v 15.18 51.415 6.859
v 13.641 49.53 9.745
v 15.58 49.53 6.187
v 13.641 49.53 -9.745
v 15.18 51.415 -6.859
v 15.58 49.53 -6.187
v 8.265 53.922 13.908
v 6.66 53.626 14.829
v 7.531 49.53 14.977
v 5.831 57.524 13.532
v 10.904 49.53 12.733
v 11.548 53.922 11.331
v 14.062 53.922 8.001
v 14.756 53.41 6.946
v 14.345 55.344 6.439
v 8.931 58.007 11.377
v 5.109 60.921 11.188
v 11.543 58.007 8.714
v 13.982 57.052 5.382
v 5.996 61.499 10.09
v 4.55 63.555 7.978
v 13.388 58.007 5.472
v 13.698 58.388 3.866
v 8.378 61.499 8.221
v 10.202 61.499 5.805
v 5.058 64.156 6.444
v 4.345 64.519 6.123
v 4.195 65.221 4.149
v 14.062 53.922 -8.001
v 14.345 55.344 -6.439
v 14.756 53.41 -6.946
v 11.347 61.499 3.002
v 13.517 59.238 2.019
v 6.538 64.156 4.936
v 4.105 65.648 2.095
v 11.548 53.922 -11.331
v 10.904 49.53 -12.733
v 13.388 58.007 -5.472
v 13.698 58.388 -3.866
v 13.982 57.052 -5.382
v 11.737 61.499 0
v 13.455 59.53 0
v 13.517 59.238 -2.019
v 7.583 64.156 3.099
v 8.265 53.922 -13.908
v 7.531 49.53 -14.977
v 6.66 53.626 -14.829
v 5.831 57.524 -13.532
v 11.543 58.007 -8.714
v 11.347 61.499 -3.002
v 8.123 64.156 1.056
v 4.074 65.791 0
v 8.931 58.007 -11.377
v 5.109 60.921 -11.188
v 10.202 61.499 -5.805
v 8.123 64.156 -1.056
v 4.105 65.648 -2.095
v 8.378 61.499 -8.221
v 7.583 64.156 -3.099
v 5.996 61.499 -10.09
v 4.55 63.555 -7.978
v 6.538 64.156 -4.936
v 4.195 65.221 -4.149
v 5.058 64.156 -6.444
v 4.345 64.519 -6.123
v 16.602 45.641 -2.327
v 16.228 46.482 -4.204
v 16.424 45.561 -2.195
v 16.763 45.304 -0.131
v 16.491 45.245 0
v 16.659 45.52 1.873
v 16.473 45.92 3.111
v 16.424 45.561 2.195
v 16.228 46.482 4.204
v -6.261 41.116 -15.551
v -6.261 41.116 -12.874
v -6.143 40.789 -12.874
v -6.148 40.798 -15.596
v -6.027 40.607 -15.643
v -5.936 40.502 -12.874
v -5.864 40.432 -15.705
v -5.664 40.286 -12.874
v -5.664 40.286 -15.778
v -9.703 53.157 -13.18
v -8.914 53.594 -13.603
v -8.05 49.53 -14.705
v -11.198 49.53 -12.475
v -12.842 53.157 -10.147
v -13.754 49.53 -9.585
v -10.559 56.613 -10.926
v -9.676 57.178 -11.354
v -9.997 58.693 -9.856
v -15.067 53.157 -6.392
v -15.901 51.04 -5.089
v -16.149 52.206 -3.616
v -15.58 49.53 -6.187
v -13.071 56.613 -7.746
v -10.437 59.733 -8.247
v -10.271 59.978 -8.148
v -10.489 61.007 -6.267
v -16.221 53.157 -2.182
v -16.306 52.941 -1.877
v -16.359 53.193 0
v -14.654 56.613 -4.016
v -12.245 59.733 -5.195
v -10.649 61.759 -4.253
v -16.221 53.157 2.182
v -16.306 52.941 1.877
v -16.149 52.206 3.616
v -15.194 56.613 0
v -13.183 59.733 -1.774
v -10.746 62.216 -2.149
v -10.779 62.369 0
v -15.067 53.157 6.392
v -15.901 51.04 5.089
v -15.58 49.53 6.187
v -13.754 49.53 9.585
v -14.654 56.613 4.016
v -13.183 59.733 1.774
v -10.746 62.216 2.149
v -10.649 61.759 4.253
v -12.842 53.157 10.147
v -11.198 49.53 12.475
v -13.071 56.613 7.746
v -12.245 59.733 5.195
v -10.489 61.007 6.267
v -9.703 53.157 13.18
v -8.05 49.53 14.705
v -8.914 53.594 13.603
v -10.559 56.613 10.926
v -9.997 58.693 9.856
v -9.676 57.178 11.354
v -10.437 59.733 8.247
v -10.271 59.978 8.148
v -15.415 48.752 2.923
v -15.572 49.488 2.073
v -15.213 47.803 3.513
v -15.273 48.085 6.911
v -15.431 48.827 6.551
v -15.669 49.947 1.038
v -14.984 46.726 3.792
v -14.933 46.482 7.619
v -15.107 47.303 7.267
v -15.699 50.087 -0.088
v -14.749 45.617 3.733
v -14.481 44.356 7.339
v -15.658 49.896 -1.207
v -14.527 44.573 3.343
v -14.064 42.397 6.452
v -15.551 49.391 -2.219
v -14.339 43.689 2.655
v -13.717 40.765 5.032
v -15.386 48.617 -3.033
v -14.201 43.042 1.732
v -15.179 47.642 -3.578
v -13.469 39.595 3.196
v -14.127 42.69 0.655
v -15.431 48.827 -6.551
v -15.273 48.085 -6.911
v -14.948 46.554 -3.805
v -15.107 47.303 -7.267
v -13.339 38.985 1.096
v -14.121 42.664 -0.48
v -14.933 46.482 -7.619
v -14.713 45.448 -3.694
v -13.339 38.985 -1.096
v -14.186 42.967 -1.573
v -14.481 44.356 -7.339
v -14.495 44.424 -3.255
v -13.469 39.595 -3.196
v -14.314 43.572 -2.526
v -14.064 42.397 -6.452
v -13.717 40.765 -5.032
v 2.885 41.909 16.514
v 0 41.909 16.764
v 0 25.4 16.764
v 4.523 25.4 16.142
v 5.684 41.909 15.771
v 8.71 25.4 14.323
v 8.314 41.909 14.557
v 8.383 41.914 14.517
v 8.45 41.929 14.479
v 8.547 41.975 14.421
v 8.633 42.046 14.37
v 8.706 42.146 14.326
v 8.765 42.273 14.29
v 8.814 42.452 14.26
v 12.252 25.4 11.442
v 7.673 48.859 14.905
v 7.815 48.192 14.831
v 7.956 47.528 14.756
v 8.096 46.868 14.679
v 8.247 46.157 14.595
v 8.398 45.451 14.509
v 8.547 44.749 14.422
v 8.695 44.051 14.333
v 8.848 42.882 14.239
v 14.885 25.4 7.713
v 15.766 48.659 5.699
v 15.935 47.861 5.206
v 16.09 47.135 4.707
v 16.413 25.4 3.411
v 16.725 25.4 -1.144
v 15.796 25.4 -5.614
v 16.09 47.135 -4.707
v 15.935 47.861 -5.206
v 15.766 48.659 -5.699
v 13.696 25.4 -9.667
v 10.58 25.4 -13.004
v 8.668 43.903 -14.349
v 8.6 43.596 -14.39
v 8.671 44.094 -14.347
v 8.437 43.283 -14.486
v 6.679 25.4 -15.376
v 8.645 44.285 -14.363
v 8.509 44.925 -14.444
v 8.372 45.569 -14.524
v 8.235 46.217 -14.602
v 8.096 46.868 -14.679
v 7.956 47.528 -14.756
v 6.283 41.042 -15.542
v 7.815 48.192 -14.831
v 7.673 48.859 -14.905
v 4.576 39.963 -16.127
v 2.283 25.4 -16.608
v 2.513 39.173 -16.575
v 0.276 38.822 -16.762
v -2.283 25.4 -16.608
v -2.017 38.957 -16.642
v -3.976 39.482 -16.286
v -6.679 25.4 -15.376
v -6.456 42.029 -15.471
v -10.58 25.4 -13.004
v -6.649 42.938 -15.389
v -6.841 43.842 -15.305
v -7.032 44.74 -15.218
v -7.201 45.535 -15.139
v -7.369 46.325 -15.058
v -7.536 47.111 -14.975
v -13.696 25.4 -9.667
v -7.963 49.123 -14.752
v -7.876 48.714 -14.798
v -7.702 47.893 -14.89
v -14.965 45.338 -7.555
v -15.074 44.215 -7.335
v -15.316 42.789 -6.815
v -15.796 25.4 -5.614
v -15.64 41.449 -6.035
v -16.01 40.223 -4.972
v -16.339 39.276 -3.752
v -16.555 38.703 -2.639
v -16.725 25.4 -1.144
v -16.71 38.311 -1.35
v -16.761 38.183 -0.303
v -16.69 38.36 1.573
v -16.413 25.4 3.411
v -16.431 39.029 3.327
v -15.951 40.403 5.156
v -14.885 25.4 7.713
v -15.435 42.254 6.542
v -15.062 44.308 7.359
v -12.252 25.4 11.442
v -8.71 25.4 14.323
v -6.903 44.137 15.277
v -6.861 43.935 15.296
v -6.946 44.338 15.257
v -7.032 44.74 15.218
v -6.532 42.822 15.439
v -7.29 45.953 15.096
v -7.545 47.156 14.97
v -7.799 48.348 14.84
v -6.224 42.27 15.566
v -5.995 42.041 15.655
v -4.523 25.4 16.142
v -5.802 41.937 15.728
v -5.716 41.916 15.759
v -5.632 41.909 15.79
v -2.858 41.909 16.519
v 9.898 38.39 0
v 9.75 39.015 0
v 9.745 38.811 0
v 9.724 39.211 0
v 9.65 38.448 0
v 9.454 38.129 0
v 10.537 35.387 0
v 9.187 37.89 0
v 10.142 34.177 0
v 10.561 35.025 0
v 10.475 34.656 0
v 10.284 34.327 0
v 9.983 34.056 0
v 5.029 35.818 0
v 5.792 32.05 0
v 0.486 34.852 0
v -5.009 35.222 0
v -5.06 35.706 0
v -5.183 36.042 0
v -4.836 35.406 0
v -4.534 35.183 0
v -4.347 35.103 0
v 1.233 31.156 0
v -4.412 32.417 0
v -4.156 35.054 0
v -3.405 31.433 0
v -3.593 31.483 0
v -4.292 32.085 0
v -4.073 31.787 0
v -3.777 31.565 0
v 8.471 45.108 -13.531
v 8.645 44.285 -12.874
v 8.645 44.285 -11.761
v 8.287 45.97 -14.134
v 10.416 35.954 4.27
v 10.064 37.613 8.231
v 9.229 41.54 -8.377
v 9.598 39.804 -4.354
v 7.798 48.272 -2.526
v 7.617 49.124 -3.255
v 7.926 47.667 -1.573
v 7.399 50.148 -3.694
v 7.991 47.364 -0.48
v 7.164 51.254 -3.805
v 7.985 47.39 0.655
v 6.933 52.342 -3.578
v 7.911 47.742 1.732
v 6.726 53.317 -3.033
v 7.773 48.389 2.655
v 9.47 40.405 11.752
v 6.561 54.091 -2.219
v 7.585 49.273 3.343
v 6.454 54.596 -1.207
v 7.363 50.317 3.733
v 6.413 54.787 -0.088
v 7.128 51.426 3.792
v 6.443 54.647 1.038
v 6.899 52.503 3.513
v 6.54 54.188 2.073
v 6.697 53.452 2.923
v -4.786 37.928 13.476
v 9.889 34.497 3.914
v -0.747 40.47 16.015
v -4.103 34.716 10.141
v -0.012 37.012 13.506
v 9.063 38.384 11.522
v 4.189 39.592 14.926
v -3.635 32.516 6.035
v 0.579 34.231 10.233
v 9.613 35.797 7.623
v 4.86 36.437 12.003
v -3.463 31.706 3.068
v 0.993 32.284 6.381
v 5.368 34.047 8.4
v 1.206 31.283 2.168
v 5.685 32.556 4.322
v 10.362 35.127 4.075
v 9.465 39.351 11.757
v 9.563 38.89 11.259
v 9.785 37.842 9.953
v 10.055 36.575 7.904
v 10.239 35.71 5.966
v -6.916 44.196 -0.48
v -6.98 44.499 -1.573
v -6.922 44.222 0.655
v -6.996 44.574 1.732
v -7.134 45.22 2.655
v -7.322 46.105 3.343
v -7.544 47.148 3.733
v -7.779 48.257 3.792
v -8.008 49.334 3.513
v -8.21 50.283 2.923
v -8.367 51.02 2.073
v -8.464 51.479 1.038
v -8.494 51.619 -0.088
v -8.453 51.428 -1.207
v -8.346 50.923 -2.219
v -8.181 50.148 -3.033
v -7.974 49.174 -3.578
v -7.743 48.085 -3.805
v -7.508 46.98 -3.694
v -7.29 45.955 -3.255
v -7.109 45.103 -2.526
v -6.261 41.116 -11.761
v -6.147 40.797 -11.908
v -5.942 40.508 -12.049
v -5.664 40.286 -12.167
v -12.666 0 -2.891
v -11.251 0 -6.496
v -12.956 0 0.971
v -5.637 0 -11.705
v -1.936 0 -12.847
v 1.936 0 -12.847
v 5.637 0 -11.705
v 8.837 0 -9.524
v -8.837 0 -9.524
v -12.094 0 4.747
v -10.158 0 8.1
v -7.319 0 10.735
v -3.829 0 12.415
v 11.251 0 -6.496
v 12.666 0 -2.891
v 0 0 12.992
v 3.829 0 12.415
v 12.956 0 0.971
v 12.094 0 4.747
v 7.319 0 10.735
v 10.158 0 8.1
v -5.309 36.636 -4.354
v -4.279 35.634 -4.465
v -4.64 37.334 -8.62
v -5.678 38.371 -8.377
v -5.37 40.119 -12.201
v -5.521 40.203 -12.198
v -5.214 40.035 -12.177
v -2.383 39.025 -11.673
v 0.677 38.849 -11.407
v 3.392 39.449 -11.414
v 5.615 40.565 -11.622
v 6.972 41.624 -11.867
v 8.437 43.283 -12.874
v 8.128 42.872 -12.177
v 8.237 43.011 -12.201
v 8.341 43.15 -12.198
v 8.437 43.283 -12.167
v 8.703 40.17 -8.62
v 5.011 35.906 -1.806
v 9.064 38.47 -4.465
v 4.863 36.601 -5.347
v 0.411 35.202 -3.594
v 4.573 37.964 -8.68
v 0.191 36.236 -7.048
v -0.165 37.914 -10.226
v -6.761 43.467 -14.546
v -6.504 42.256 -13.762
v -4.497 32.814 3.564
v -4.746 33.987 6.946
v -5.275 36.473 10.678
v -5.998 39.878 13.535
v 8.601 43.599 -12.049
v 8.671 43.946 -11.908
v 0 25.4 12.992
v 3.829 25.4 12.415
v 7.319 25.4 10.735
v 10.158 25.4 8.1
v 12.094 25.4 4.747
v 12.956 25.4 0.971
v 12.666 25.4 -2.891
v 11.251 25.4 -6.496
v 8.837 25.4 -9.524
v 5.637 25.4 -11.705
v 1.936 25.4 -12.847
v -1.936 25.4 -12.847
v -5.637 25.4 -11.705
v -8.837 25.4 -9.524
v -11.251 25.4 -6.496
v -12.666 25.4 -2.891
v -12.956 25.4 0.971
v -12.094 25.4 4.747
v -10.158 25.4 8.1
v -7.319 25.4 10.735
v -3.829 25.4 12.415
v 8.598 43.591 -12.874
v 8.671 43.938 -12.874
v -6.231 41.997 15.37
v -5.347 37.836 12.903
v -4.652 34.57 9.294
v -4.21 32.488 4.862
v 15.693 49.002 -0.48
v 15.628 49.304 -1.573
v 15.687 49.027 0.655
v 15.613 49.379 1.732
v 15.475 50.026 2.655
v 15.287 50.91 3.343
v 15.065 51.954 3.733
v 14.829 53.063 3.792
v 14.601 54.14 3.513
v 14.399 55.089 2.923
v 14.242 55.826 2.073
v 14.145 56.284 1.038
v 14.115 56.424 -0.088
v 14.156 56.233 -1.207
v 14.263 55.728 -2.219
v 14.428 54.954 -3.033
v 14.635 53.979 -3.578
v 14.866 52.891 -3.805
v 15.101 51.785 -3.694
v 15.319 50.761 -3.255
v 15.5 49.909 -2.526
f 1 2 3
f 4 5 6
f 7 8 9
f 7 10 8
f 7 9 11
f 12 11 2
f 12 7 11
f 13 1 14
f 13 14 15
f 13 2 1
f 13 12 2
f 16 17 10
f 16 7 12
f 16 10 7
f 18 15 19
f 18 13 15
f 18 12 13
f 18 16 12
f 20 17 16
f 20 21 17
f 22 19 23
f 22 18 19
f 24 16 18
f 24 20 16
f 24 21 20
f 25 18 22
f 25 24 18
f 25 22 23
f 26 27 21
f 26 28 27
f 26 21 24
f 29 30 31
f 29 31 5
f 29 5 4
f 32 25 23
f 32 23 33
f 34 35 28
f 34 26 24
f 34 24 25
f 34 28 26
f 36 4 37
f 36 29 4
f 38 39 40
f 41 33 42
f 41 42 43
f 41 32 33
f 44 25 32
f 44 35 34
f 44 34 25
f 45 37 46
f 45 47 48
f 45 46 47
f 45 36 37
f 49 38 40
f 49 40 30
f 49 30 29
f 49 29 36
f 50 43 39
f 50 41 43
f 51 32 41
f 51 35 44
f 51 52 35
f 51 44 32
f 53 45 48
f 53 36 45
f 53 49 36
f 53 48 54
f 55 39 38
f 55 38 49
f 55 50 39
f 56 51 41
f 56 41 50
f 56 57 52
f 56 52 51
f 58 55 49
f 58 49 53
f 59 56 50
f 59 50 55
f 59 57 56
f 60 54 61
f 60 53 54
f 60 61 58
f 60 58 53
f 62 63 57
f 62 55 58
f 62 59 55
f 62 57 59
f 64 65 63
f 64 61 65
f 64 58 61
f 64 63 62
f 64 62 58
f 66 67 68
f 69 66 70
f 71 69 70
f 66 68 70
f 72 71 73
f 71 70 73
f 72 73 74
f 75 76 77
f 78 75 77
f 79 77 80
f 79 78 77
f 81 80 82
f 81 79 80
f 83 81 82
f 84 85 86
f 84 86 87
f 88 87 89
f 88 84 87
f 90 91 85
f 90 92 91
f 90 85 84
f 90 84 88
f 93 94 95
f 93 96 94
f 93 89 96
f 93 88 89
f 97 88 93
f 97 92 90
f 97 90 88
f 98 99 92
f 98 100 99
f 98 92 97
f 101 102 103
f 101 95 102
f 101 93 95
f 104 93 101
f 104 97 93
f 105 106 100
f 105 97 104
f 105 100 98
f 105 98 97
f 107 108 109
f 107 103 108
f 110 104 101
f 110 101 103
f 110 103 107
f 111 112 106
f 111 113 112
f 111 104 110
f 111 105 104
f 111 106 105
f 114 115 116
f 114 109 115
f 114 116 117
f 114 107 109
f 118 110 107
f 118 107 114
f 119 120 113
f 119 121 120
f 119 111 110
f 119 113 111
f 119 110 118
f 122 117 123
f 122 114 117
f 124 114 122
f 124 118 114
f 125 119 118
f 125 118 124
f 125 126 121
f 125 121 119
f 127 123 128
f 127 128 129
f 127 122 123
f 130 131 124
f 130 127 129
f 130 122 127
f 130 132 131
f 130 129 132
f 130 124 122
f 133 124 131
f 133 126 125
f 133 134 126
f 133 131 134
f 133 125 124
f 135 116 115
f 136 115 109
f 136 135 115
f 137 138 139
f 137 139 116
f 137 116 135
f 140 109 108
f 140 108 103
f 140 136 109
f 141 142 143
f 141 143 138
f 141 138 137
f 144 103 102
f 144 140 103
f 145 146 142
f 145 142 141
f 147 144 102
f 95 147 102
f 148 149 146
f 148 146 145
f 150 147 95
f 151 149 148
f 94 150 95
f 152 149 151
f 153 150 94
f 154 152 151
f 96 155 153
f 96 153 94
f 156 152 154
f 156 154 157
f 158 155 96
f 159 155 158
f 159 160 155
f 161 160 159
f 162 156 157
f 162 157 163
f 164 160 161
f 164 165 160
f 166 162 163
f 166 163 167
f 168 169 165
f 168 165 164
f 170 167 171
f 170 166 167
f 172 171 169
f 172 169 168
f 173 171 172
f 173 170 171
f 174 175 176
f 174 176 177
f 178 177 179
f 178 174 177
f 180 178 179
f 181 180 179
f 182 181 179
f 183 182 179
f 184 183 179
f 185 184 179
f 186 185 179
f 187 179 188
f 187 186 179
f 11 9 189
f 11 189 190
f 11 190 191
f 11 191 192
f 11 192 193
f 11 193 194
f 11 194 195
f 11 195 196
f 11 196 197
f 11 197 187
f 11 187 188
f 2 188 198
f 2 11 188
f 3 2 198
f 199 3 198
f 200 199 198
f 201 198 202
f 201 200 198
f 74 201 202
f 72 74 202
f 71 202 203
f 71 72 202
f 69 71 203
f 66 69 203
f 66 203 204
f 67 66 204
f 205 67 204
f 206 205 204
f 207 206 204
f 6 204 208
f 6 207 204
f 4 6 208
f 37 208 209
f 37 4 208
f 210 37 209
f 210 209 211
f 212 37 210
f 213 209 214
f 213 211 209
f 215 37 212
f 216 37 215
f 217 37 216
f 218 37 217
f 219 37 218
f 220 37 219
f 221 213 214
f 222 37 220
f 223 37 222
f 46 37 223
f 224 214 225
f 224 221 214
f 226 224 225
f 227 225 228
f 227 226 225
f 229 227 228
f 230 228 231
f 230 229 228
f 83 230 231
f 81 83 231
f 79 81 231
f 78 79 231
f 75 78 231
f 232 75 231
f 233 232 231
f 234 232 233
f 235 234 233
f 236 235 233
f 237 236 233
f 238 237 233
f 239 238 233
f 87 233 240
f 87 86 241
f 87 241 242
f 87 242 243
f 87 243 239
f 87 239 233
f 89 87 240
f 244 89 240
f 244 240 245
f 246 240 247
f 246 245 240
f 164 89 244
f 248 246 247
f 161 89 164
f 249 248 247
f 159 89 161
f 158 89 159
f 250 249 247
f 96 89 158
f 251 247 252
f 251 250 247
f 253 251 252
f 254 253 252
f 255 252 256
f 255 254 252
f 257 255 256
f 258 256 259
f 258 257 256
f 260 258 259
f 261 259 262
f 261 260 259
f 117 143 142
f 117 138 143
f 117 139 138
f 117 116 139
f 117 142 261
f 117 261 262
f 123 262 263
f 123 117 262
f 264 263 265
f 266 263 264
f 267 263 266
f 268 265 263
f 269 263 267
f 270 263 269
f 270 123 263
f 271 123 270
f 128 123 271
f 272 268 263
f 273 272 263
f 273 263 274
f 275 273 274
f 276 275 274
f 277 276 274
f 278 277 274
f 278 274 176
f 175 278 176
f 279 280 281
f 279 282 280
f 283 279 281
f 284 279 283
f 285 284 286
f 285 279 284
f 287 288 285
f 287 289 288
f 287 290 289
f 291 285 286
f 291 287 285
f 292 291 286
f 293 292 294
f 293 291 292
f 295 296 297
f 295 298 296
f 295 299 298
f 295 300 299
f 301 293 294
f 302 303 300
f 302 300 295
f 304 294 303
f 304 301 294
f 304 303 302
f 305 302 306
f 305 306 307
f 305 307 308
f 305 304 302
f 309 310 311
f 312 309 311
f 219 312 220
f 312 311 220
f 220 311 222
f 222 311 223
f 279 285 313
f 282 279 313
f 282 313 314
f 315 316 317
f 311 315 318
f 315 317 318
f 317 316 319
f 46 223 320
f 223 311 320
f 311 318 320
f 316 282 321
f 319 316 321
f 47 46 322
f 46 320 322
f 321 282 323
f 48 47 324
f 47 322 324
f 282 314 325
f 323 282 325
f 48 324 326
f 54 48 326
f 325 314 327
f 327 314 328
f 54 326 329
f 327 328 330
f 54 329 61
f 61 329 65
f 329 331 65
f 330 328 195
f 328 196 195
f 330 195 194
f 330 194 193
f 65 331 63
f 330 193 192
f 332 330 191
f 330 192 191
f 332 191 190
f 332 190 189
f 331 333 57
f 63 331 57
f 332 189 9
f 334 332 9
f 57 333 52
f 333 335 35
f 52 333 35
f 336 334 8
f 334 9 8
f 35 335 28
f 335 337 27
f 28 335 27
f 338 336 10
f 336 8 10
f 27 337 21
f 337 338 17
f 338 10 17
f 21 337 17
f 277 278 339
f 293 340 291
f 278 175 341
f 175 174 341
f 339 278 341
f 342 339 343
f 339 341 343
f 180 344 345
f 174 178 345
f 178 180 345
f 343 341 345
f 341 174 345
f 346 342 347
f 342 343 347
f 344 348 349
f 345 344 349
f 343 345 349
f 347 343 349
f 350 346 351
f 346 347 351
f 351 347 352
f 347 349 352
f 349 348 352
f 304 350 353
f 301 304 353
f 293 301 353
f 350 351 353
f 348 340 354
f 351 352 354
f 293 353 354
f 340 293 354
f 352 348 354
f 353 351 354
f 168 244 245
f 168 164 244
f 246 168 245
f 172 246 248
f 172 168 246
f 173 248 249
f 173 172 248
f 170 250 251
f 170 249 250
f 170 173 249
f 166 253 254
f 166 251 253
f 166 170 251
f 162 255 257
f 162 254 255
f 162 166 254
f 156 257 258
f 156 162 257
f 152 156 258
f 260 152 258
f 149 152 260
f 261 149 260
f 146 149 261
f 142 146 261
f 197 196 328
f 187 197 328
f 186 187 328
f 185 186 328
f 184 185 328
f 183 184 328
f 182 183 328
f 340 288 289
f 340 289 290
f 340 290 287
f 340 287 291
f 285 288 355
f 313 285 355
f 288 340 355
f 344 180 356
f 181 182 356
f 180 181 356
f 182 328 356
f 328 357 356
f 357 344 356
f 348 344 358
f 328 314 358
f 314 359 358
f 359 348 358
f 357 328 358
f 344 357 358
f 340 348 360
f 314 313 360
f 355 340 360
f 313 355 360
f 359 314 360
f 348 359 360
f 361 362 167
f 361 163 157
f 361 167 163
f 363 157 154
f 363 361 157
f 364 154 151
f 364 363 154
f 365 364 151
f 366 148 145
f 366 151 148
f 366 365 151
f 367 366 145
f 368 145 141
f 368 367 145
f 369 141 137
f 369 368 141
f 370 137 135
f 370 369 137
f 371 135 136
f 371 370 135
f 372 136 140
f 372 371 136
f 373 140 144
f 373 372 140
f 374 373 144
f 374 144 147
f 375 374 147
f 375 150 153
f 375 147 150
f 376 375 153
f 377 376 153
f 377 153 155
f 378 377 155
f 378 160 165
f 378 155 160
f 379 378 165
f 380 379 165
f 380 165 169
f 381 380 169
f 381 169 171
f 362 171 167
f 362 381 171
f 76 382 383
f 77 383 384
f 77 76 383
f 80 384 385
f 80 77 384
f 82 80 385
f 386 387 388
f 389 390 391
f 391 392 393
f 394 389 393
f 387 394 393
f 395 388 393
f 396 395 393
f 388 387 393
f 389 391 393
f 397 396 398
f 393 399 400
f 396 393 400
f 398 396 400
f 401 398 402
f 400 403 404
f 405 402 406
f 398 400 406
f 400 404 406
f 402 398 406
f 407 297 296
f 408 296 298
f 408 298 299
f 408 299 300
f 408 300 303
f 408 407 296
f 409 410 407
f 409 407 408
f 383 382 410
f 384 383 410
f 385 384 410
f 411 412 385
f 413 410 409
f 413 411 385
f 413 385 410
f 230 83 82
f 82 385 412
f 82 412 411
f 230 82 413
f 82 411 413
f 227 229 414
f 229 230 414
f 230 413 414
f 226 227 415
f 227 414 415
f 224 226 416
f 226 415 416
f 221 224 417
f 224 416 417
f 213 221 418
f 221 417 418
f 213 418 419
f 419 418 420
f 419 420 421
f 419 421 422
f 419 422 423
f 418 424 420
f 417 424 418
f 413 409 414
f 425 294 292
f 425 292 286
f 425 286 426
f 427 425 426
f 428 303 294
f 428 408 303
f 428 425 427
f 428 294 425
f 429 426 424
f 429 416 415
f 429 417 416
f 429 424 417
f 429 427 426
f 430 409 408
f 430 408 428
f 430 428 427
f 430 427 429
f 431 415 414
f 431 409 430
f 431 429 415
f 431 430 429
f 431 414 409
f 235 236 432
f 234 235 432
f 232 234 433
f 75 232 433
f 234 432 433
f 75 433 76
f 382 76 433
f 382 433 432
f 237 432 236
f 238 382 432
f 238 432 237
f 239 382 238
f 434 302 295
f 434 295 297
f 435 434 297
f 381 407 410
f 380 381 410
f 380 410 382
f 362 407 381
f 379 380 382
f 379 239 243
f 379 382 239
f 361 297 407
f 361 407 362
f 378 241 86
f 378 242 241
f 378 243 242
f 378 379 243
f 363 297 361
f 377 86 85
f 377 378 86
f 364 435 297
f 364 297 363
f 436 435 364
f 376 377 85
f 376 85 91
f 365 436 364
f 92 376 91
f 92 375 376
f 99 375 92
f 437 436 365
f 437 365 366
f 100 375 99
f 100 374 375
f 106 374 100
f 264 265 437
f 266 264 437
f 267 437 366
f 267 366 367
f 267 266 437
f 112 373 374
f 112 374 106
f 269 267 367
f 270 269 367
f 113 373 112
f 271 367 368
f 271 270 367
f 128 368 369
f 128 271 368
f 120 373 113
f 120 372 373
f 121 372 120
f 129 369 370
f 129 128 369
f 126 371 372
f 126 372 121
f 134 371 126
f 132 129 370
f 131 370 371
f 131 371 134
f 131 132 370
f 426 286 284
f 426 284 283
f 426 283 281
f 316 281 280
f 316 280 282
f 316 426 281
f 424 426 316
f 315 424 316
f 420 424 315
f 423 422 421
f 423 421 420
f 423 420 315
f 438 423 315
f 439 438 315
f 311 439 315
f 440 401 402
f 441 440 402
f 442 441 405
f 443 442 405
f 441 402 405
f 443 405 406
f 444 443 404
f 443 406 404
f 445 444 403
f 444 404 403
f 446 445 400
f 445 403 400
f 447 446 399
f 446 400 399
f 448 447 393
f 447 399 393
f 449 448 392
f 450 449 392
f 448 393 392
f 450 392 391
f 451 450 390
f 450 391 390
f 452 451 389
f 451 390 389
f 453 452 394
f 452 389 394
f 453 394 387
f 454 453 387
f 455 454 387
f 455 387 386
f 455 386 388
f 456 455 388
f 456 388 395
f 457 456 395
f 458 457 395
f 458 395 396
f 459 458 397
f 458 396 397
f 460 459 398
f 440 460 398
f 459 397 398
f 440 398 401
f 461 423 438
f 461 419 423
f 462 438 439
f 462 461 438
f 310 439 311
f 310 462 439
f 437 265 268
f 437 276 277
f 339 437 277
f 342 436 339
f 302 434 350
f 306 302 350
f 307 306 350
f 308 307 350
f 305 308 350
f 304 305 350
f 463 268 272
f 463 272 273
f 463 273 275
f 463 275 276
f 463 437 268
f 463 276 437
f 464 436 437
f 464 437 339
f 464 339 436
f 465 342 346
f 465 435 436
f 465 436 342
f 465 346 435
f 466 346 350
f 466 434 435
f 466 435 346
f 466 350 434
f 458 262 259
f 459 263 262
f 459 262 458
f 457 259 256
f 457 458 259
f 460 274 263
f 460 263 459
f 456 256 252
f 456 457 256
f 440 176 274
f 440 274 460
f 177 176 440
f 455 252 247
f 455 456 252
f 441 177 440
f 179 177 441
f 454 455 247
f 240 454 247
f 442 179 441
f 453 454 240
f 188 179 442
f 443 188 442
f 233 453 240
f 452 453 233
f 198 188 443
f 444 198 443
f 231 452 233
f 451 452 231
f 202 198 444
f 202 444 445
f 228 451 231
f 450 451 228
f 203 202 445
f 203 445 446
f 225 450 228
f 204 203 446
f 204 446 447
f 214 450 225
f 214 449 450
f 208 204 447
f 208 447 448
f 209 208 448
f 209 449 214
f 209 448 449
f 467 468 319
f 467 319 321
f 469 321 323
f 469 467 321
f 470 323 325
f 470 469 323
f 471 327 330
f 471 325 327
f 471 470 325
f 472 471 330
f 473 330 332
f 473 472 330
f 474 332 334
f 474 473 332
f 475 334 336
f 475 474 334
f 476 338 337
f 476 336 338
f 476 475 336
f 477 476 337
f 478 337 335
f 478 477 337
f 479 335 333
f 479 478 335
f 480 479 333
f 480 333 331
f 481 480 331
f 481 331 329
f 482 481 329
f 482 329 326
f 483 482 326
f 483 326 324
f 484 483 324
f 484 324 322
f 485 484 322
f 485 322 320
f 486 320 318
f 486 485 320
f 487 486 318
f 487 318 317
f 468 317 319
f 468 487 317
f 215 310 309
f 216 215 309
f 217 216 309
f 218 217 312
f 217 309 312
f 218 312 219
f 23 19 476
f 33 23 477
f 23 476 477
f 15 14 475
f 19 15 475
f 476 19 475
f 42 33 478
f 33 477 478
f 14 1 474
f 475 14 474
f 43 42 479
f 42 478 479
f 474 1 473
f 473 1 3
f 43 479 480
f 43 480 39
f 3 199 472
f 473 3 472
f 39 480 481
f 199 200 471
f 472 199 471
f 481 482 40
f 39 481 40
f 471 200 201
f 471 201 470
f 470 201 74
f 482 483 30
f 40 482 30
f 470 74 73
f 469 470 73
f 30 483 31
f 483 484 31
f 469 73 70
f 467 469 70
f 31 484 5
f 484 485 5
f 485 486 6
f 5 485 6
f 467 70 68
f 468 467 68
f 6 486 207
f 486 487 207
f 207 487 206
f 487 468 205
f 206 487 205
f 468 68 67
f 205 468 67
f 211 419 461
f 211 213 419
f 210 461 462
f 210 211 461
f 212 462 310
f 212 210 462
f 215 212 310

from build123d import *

# Parameters (mm, degrees)
SKETCH1_R                     = 12.9921
BOSS_EXTRUDE1_DEPTH           = 25.4
CUT_EXTRUDE1_DEPTH            = 104.344307451
CUT_EXTRUDE1_DEPTH_BACK       = 104.344307451
SKETCH3_R                     = 3.81
CUT_REVOLVE10_ANGLE           = 90
CUT_REVOLVE10_OTHER_WAY_ANGLE = 180
CUT_EXTRUDE4_DEPTH            = 32.004
FILLET1_R                     = 1.27
SKETCH15_R                    = 7.62
CUT_EXTRUDE5_DEPTH            = 10.16


with BuildPart() as part:
    # Sketch1 → Boss-Extrude1 (new body)
    with BuildSketch(Plane(origin=(0, 0, 0), x_dir=(1, 0, 0), z_dir=(0, 1, 0))):
        Circle(SKETCH1_R)
    extrude(amount=BOSS_EXTRUDE1_DEPTH)

    # Sketch2 → Revolve1 (revolve)
    with BuildSketch(Plane(origin=(0, 0, 0), x_dir=(0, 0, -1), z_dir=(1, 0, 0))):
        with BuildLine():
            Line((-16.764, 25.4), (-16.764, 49.53))
            ThreePointArc((-16.764, 49.53), (-11.85393808, 61.38393808), (0, 66.294))
            Line((0, 66.294), (0, 25.4))
            Line((0, 25.4), (-16.764, 25.4))
        make_face()
    revolve(axis=Axis((0, 25.4, 0), (0, 1, 0)))

    # Sketch3 → Cut-Extrude1 (cut, two sides: drawn at the far end of the back side and taken through both)
    with BuildSketch(Plane(origin=(-10.366451402, 98.300319395, 0), x_dir=(0, 0, -1), z_dir=(-0.9781476007338062, -0.20791169081775643, 0)).offset(-CUT_EXTRUDE1_DEPTH_BACK)):
        with Locations((0, 49.859877342)):
            Circle(SKETCH3_R)
    extrude(amount=CUT_EXTRUDE1_DEPTH + CUT_EXTRUDE1_DEPTH_BACK, mode=Mode.SUBTRACT)

    # Sketch11 → Cut-Revolve10 (revolve, cut)
    with BuildSketch(Plane.XY):
        with BuildLine():
            Line((-7.701934208, 47.892903347), (-11.162976054, 64.175825024))
            ThreePointArc((-11.162976054, 64.175825024), (-4.101170935, 67.482510185), (3.695979409, 67.570287171))
            Line((3.695979409, 67.570287171), (7.205035227, 51.061477515))
            Line((7.205035227, 51.061477515), (-7.701934208, 47.892903347))
        make_face()
    revolve(axis=Axis((17.487516564, 53.247086393, 0), (-0.9781476007338064, -0.2079116908177564, 0)), revolution_arc=CUT_REVOLVE10_ANGLE, mode=Mode.SUBTRACT)

    # Sketch11 → Cut-Revolve10 other way (revolve, cut)
    with BuildSketch(Plane.XY):
        with BuildLine():
            Line((-7.701934208, 47.892903347), (-11.162976054, 64.175825024))
            ThreePointArc((-11.162976054, 64.175825024), (-4.101170935, 67.482510185), (3.695979409, 67.570287171))
            Line((3.695979409, 67.570287171), (7.205035227, 51.061477515))
            Line((7.205035227, 51.061477515), (-7.701934208, 47.892903347))
        make_face()
    revolve(axis=Axis((17.487516564, 53.247086393, 0), (0.9781476007338064, 0.2079116908177564, 0)), revolution_arc=CUT_REVOLVE10_OTHER_WAY_ANGLE, mode=Mode.SUBTRACT)

    # Sketch13 → Cut-Revolve11 (revolve, cut)
    with BuildSketch(Plane.XY):
        with BuildLine():
            Line((-8.49407775, 51.619645705), (6.412891685, 54.788219873))
            Line((6.412891685, 54.788219873), (2.927360083, 71.186356794))
            ThreePointArc((2.927360083, 71.186356794), (-4.869286819, 71.216520857), (-11.979609352, 68.017782626))
            Line((-11.979609352, 68.017782626), (-8.49407775, 51.619645705))
        make_face()
    revolve(axis=Axis((-8.49407775, 51.619645705, 0), (0.9781476007338064, 0.20791169081775637, 0)), mode=Mode.SUBTRACT)

    # Sketch14 → Cut-Extrude4 (cut)
    with BuildSketch(Plane.XY):
        with BuildLine():
            Line((-7.701934208, 47.892903347), (-6.149656223, 40.590009601))
            ThreePointArc((-6.149656223, 40.590009601), (1.969552427, 39.042311826), (8.757313212, 43.758583769))
            Line((8.757313212, 43.758583769), (7.205035227, 51.061477515))
            Line((7.205035227, 51.061477515), (-7.701934208, 47.892903347))
        make_face()
    extrude(amount=-CUT_EXTRUDE4_DEPTH, mode=Mode.SUBTRACT)

    # Fillet1
    fillet1_edges = [part.edges().sort_by_distance(p)[0] for p in [
        (-4.840027967, 34.428693074, 9.361457334),
        (-5.306564153, 36.623573262, -6.782727573),
        (-6.149656223, 40.590009601, -14.000445211),
        (8.757313212, 43.758583769, -13.350191985),
        (9.600405282, 39.79214743, -6.782727573),
        (10.298585015, 36.507470038, 7.966497668),
    ]]
    fillet(fillet1_edges, radius=FILLET1_R)

    # Sketch15 → Cut-Extrude5 (cut)
    with BuildSketch(Plane(origin=(-4.834136469, -1.027527427, 0), x_dir=(0, 0, -1), z_dir=(-0.9781476007338062, -0.20791169081775643, 0))):
        with Locations((0, -48.447650664)):
            Circle(SKETCH15_R)
    cut_extrude5 = extrude(amount=CUT_EXTRUDE5_DEPTH, mode=Mode.SUBTRACT)

    # Mirror1: Cut-Extrude5 across plane
    add(cut_extrude5.mirror(Plane(origin=(10.072832966, 2.141046741, 0), x_dir=(0, 0, 1), z_dir=(-0.9781476007338062, -0.20791169081775643, 0))), mode=Mode.SUBTRACT)


solid = part.part
